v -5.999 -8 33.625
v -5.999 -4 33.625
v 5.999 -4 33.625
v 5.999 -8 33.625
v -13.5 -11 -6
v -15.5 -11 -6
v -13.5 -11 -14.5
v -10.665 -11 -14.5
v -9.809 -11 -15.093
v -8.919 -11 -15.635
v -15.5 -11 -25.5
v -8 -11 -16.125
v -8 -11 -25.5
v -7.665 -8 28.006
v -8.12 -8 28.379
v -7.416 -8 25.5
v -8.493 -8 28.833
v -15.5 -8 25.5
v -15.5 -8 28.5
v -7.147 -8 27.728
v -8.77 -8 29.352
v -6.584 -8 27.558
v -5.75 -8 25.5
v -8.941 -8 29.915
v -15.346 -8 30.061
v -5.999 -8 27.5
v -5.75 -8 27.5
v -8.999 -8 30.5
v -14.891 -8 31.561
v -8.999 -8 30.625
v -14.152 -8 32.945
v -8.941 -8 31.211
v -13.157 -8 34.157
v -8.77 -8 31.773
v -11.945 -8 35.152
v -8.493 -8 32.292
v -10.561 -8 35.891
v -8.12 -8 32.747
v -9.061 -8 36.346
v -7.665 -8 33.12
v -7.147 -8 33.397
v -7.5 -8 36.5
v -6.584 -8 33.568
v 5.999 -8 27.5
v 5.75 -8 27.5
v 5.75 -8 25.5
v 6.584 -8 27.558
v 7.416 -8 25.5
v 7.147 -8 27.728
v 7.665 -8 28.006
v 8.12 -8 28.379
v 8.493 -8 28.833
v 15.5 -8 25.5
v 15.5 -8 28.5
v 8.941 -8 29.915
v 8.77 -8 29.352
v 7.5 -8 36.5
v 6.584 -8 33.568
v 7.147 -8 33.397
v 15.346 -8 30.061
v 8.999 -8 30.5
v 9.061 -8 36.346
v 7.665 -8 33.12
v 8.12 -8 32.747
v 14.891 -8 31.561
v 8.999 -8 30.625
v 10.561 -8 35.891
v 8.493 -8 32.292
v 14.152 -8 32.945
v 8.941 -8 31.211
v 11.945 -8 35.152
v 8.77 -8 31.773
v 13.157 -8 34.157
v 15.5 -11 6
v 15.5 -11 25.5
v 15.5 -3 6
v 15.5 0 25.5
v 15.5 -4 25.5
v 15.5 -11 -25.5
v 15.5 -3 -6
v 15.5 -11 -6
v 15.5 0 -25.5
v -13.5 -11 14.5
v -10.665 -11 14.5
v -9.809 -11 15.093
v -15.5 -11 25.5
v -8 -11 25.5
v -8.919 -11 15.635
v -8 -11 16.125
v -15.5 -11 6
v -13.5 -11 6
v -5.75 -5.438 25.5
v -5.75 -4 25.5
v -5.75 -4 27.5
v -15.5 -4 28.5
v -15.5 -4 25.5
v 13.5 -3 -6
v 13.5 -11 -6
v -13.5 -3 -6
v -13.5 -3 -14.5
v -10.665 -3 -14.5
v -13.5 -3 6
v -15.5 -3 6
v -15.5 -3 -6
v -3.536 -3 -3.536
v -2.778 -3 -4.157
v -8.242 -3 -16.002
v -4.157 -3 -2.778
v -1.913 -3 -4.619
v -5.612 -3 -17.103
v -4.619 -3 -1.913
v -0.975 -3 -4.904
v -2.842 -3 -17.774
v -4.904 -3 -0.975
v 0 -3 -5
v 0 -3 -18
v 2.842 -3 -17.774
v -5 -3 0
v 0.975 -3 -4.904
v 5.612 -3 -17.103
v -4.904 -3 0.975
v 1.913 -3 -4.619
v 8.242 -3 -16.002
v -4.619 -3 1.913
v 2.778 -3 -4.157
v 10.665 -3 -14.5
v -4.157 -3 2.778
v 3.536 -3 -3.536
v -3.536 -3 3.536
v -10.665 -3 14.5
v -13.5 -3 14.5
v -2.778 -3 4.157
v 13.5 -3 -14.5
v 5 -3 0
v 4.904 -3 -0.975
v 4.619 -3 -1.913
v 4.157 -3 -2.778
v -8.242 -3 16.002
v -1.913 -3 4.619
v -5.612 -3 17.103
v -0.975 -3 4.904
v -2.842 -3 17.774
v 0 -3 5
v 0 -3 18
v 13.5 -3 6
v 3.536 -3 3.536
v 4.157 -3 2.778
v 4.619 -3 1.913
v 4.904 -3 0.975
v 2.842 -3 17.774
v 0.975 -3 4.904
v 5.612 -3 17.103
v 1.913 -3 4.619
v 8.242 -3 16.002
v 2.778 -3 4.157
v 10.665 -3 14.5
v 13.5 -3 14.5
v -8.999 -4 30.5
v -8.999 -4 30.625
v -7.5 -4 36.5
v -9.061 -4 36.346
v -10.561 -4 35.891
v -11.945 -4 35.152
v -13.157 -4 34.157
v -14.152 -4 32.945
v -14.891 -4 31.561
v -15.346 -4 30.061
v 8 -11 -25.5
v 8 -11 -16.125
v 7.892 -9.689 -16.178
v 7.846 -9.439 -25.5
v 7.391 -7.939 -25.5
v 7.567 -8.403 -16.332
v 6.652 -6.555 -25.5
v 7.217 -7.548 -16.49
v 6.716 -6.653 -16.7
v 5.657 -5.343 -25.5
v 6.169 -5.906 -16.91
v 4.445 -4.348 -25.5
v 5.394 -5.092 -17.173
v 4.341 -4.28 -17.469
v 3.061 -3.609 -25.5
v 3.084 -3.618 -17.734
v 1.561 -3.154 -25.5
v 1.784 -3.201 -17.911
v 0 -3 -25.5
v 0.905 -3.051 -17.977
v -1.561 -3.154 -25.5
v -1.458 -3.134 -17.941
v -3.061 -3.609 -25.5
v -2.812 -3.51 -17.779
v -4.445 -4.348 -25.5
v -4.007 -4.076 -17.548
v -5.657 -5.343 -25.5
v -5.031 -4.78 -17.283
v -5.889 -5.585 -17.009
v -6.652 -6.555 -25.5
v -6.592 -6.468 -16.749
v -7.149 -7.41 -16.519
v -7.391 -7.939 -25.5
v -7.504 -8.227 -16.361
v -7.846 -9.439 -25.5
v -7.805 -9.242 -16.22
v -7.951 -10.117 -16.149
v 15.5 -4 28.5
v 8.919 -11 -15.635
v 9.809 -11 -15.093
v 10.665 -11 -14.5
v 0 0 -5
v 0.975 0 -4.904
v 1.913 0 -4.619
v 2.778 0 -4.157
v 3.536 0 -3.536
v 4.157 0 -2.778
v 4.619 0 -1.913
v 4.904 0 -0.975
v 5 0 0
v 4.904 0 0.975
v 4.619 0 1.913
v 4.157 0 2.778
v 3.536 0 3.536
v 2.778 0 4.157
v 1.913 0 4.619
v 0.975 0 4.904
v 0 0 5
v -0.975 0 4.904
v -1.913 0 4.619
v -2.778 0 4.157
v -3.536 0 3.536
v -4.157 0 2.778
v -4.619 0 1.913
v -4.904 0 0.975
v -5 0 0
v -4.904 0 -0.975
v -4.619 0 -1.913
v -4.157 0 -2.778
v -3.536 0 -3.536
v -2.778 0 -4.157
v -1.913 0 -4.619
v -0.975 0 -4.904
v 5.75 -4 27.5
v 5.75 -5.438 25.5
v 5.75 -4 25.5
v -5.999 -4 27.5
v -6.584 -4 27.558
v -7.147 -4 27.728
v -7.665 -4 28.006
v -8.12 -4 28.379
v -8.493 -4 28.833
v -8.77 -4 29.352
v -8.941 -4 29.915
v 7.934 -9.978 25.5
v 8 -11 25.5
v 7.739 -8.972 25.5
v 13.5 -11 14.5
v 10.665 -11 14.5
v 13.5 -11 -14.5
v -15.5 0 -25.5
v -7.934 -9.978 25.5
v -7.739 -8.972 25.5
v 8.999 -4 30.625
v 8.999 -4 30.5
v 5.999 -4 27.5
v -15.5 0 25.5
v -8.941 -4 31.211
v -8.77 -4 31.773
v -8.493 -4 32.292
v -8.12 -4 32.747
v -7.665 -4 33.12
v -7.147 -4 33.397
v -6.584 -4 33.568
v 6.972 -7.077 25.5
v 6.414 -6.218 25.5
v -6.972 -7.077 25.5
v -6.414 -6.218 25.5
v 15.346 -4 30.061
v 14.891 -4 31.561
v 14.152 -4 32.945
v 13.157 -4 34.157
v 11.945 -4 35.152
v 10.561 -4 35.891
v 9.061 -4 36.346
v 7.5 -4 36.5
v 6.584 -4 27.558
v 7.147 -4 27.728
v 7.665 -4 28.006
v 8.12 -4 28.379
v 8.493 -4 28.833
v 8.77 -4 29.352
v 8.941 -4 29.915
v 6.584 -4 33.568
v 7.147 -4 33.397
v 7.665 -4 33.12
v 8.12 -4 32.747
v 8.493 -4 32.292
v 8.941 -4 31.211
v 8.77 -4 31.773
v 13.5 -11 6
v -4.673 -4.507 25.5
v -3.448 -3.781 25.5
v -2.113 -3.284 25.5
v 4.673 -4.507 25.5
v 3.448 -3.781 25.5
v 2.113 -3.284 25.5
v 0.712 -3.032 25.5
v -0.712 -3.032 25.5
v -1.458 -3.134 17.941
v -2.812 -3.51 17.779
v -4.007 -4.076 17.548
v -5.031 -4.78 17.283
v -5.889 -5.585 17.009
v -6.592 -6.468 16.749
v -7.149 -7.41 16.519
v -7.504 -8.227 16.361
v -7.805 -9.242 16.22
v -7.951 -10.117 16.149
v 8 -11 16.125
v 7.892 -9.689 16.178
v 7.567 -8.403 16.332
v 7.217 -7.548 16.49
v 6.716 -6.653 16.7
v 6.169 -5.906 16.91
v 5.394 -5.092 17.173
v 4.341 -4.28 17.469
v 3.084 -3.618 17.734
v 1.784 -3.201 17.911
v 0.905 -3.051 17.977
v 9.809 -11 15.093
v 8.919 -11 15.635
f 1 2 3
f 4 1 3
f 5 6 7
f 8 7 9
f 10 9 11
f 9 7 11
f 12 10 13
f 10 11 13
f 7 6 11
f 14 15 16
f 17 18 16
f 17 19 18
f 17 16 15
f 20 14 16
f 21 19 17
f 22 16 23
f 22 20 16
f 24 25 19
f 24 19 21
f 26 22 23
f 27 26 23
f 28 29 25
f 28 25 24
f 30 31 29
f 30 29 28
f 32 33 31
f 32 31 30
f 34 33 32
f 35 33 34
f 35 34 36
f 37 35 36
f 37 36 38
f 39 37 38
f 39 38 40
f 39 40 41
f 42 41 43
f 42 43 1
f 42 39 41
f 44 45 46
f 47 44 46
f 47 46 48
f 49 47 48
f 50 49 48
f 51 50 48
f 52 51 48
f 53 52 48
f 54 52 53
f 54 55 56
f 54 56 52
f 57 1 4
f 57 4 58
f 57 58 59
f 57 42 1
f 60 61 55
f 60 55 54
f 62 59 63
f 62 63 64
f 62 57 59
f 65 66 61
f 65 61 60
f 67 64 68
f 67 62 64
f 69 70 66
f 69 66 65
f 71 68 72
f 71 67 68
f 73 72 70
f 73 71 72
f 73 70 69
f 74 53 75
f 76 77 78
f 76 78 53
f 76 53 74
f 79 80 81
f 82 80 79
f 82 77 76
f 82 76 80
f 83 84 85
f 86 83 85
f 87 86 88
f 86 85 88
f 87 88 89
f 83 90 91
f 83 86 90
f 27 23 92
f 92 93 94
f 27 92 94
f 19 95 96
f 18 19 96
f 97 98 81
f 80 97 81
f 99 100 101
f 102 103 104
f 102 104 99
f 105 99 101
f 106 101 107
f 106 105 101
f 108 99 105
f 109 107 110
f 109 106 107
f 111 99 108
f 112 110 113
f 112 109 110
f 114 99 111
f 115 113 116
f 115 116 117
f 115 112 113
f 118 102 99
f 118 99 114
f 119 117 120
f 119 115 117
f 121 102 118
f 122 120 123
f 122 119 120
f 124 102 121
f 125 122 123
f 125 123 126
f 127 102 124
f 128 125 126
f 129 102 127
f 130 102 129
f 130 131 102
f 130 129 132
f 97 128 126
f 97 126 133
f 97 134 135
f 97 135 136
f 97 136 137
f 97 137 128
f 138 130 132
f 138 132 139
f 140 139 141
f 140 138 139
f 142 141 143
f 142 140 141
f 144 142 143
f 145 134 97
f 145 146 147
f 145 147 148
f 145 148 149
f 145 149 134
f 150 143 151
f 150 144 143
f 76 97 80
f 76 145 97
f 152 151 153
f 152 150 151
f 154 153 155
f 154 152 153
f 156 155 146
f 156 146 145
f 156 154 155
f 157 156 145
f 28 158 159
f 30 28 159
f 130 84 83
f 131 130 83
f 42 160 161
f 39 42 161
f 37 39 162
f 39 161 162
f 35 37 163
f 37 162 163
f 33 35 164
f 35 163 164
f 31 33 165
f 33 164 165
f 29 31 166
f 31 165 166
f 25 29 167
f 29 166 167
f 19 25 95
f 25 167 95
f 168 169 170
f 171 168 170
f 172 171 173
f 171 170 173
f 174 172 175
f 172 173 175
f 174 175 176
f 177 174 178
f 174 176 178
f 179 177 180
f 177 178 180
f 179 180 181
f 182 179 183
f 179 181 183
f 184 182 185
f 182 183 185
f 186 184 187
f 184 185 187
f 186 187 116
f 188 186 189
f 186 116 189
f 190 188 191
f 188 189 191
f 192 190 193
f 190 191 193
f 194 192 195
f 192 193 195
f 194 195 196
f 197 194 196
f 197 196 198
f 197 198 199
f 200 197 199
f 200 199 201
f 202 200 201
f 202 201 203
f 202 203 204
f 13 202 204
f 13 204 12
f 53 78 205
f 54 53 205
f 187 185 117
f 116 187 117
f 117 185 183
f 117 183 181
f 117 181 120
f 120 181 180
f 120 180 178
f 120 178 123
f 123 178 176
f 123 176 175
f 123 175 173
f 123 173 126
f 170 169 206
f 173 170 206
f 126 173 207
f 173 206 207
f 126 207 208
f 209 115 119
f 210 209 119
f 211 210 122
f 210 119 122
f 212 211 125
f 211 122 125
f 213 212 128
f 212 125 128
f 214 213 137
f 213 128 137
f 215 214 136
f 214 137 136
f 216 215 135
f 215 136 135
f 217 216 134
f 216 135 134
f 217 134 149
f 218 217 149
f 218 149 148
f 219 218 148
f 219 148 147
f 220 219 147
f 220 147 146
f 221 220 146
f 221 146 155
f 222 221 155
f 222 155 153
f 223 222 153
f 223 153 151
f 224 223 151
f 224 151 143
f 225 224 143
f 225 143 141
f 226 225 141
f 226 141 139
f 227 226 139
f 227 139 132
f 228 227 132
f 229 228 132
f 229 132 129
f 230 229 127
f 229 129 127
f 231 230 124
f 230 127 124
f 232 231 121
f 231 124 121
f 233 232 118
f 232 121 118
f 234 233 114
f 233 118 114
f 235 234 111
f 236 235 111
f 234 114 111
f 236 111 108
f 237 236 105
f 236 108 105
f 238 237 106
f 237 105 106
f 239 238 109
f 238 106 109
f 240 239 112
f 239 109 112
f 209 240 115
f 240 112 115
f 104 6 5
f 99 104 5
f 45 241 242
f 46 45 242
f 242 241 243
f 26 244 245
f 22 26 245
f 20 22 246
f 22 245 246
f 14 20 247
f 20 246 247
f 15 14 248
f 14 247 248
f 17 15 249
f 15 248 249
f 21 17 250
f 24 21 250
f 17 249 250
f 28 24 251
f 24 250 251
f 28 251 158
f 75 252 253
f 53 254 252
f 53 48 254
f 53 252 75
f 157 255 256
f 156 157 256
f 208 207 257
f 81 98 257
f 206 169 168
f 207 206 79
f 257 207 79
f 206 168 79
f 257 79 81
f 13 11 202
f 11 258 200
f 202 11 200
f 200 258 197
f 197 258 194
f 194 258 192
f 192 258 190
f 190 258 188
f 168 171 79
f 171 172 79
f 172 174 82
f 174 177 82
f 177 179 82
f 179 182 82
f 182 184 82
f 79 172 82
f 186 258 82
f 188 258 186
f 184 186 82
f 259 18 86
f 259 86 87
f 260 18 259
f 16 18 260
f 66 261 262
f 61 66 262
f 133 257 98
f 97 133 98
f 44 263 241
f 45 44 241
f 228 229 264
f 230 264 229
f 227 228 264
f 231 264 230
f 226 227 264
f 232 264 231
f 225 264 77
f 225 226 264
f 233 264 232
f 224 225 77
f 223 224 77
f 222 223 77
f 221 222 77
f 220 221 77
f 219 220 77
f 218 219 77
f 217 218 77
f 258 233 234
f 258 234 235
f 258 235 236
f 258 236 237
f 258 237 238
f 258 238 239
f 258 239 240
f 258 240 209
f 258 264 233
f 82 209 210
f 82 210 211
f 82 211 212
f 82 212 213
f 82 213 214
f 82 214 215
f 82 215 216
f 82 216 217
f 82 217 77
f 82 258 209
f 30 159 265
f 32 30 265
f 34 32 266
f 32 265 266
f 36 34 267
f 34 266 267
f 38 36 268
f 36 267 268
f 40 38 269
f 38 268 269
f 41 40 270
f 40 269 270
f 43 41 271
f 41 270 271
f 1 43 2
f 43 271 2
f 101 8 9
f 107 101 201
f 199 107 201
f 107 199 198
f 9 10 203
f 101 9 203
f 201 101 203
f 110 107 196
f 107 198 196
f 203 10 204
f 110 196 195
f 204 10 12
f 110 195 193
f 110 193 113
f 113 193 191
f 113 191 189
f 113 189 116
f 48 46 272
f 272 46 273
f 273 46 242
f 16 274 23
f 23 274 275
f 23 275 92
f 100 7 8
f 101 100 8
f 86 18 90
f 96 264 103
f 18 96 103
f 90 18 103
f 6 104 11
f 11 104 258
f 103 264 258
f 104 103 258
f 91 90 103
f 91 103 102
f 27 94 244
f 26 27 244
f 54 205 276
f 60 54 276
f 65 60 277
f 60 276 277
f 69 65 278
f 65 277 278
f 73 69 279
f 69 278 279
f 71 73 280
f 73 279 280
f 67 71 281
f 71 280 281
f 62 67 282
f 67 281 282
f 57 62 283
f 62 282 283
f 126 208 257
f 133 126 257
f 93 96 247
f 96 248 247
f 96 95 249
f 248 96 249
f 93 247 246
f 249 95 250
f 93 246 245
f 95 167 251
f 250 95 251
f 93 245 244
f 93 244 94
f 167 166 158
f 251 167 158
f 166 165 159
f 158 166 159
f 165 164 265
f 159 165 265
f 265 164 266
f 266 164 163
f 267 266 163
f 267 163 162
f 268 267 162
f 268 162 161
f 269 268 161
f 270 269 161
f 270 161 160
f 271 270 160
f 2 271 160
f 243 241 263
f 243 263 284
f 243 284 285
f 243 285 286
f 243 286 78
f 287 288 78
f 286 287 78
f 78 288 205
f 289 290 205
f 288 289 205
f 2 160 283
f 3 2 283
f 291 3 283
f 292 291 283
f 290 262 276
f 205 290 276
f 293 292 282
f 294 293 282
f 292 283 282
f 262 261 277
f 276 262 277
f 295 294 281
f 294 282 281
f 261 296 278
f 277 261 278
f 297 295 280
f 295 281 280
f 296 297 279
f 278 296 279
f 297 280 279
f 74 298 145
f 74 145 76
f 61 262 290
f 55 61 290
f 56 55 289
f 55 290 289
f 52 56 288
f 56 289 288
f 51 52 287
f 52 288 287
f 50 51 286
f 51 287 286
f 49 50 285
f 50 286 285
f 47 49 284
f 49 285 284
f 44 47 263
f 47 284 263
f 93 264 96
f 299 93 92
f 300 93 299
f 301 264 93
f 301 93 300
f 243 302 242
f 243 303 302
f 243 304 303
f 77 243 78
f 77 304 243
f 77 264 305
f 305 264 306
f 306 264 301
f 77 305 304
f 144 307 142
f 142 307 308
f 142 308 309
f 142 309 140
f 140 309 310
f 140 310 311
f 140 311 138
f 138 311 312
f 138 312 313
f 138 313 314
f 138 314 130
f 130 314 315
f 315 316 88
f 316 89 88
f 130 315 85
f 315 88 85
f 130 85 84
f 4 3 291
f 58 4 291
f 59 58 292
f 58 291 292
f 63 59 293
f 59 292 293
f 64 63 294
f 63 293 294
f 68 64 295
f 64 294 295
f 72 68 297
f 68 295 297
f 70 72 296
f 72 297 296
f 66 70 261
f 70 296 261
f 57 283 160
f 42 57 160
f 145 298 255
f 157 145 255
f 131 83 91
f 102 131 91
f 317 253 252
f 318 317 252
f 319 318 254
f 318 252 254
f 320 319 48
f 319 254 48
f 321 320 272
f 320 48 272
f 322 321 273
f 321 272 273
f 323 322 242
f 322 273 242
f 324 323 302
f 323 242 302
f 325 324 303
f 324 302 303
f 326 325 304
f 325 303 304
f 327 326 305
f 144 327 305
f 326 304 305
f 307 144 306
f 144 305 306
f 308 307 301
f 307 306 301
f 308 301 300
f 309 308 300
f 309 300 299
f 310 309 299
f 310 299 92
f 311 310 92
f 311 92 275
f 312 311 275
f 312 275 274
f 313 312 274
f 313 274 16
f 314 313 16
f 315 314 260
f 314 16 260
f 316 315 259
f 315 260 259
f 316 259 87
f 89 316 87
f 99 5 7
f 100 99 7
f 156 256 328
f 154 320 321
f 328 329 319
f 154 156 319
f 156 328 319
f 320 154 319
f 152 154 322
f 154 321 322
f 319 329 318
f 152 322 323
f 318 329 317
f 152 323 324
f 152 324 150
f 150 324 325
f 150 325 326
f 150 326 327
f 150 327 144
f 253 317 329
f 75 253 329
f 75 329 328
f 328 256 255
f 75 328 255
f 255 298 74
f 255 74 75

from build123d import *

# Parameters (mm, degrees)
SKETCH_1_W               = 31
SKETCH_1_H               = 51
EXTRUDE_1_DEPTH          = 0.0001
EXTRUDE_1_DEPTH_BACK     = 11
SKETCH_2_W               = 27
SKETCH_2_H               = 12
SKETCH_2_R               = 5
SKETCH_2_W_2             = 2
CUT_EXTRUDE_1_DEPTH      = 0.0001
CUT_EXTRUDE_1_DEPTH_BACK = 8
SKETCH_3_R               = 5
CUT_EXTRUDE_3_DEPTH      = 12
SKETCH_4_R               = 8
CUT_EXTRUDE_4_DEPTH      = 102
EXTRUDE_2_DEPTH          = 4


with BuildPart() as part:
    # Эскиз1 → Бобышка-Вытянуть1 (new, two sides)
    with BuildSketch(Plane(origin=(0, 0, 0), x_dir=(1, 0, 0), z_dir=(0, 1, 0))) as extrude_1_sk:
        Rectangle(SKETCH_1_W, SKETCH_1_H)
    extrude(amount=EXTRUDE_1_DEPTH)
    extrude(extrude_1_sk.sketch, amount=-EXTRUDE_1_DEPTH_BACK)

    # Эскиз2 → Вырез-Вытянуть1 (cut, two sides)
    with BuildSketch(Plane.XZ.offset(11)) as cut_extrude_1_sk:
        with BuildLine():
            Line((-13.5, 11.9058809), (-13.5, 6))
            Line((-13.5, 6), (13.5, 6))
            Line((13.5, 6), (13.5, 11.9058809))
            ThreePointArc((13.5, 11.9058809), (12.152101624, 13.27879611), (10.665364504, 14.5))
            Line((10.665364504, 14.5), (-10.665364504, 14.5))
            ThreePointArc((-10.665364504, 14.5), (-12.152101624, 13.27879611), (-13.5, 11.9058809))
        make_face()
        Rectangle(SKETCH_2_W, SKETCH_2_H)
        with Locations(Location((0, 0, 0), (0, 0, 90))):
            Circle(SKETCH_2_R, mode=Mode.SUBTRACT)
        with Locations((-14.5, 0)):
            Rectangle(SKETCH_2_W_2, SKETCH_2_H)
        with Locations((14.5, 0)):
            Rectangle(SKETCH_2_W_2, SKETCH_2_H)
        with BuildLine():
            Line((13.5, -6), (-13.5, -6))
            Line((-13.5, -6), (-13.5, -11.9058809))
            ThreePointArc((-13.5, -11.9058809), (-12.152101624, -13.27879611), (-10.665364504, -14.5))
            Line((-10.665364504, -14.5), (10.665364504, -14.5))
            ThreePointArc((10.665364504, -14.5), (12.152101624, -13.27879611), (13.5, -11.9058809))
            Line((13.5, -11.9058809), (13.5, -6))
        make_face()
        with BuildLine():
            Line((13.5, -14.5), (13.5, -11.9058809))
            ThreePointArc((13.5, -11.9058809), (12.152101624, -13.27879611), (10.665364504, -14.5))
            Line((10.665364504, -14.5), (13.5, -14.5))
        make_face()
        with BuildLine():
            Line((10.665364504, -14.5), (-10.665364504, -14.5))
            ThreePointArc((-10.665364504, -14.5), (0, -18), (10.665364504, -14.5))
        make_face()
        with BuildLine():
            ThreePointArc((-10.665364504, -14.5), (-12.152101624, -13.27879611), (-13.5, -11.9058809))
            Line((-13.5, -11.9058809), (-13.5, -14.5))
            Line((-13.5, -14.5), (-10.665364504, -14.5))
        make_face()
        with BuildLine():
            Line((-13.5, 14.5), (-13.5, 11.9058809))
            ThreePointArc((-13.5, 11.9058809), (-12.152101624, 13.27879611), (-10.665364504, 14.5))
            Line((-10.665364504, 14.5), (-13.5, 14.5))
        make_face()
        with BuildLine():
            ThreePointArc((10.665364504, 14.5), (0, 18), (-10.665364504, 14.5))
            Line((-10.665364504, 14.5), (10.665364504, 14.5))
        make_face()
        with BuildLine():
            ThreePointArc((10.665364504, 14.5), (12.152101624, 13.27879611), (13.5, 11.9058809))
            Line((13.5, 11.9058809), (13.5, 14.5))
            Line((13.5, 14.5), (10.665364504, 14.5))
        make_face()
    extrude(amount=CUT_EXTRUDE_1_DEPTH, mode=Mode.SUBTRACT)
    extrude(cut_extrude_1_sk.sketch, amount=-CUT_EXTRUDE_1_DEPTH_BACK, mode=Mode.SUBTRACT)

    # Эскиз3 → Вырез-Вытянуть3 (cut)
    with BuildSketch(Plane.XZ.offset(11)):
        with Locations(Location((0, 0, 0), (0, 0, 270))):
            Circle(SKETCH_3_R)
    extrude(amount=-CUT_EXTRUDE_3_DEPTH, mode=Mode.SUBTRACT)

    # Эскиз4 → Вырез-Вытянуть4 (cut)
    with BuildSketch(Plane.XY.offset(25.5)):
        with Locations((0, -11)):
            Circle(SKETCH_4_R)
    extrude(amount=-CUT_EXTRUDE_4_DEPTH, mode=Mode.SUBTRACT)

    # Sketch 1 2 → Бобышка-Вытянуть2 (add)
    with BuildSketch(Plane(origin=(-15.5, -3.9999, 25.5), x_dir=(0.9953500135553002, 0, 0.0963241948601902), z_dir=(0, -1, 0))):
        with BuildLine():
            Line((0, 0), (9.704662632, -0.9391609))
            Line((9.704662632, -0.9391609), (9.897311022, 1.051539127))
            Line((9.897311022, 1.051539127), (9.649856542, 1.075486335))
            ThreePointArc((9.649856542, 1.075486335), (7.62303842, 2.154414617), (6.952779086, 4.35050896))
            Line((6.952779086, 4.35050896), (6.964859124, 4.475336021))
            ThreePointArc((6.964859124, 4.475336021), (8.043787406, 6.502154143), (10.239881749, 7.172413477))
            Line((10.239881749, 7.172413477), (22.181315865, 6.01679082))
            ThreePointArc((22.181315865, 6.01679082), (24.208133987, 4.937862538), (24.878393321, 2.741768195))
            Line((24.878393321, 2.741768195), (24.866313283, 2.616941135))
            ThreePointArc((24.866313283, 2.616941135), (23.787385001, 0.590123012), (21.591290658, -0.080136321))
            Line((21.591290658, -0.080136321), (21.343836178, -0.056189114))
            Line((21.343836178, -0.056189114), (21.151187788, -2.046889141))
            Line((21.151187788, -2.046889141), (30.85585042, -2.986050041))
            Line((30.85585042, -2.986050041), (31.144823005, 0))
            ThreePointArc((31.144823005, 0), (29.357464781, 5.856251582), (23.952616455, 8.733393667))
            Line((23.952616455, 8.733393667), (9.022366252, 10.17825659))
            ThreePointArc((9.022366252, 10.17825659), (3.16611467, 8.390898367), (0.288972585, 2.986050041))
            Line((0.288972585, 2.986050041), (0, 0))
        make_face()
    extrude(amount=EXTRUDE_2_DEPTH)


solid = part.part
